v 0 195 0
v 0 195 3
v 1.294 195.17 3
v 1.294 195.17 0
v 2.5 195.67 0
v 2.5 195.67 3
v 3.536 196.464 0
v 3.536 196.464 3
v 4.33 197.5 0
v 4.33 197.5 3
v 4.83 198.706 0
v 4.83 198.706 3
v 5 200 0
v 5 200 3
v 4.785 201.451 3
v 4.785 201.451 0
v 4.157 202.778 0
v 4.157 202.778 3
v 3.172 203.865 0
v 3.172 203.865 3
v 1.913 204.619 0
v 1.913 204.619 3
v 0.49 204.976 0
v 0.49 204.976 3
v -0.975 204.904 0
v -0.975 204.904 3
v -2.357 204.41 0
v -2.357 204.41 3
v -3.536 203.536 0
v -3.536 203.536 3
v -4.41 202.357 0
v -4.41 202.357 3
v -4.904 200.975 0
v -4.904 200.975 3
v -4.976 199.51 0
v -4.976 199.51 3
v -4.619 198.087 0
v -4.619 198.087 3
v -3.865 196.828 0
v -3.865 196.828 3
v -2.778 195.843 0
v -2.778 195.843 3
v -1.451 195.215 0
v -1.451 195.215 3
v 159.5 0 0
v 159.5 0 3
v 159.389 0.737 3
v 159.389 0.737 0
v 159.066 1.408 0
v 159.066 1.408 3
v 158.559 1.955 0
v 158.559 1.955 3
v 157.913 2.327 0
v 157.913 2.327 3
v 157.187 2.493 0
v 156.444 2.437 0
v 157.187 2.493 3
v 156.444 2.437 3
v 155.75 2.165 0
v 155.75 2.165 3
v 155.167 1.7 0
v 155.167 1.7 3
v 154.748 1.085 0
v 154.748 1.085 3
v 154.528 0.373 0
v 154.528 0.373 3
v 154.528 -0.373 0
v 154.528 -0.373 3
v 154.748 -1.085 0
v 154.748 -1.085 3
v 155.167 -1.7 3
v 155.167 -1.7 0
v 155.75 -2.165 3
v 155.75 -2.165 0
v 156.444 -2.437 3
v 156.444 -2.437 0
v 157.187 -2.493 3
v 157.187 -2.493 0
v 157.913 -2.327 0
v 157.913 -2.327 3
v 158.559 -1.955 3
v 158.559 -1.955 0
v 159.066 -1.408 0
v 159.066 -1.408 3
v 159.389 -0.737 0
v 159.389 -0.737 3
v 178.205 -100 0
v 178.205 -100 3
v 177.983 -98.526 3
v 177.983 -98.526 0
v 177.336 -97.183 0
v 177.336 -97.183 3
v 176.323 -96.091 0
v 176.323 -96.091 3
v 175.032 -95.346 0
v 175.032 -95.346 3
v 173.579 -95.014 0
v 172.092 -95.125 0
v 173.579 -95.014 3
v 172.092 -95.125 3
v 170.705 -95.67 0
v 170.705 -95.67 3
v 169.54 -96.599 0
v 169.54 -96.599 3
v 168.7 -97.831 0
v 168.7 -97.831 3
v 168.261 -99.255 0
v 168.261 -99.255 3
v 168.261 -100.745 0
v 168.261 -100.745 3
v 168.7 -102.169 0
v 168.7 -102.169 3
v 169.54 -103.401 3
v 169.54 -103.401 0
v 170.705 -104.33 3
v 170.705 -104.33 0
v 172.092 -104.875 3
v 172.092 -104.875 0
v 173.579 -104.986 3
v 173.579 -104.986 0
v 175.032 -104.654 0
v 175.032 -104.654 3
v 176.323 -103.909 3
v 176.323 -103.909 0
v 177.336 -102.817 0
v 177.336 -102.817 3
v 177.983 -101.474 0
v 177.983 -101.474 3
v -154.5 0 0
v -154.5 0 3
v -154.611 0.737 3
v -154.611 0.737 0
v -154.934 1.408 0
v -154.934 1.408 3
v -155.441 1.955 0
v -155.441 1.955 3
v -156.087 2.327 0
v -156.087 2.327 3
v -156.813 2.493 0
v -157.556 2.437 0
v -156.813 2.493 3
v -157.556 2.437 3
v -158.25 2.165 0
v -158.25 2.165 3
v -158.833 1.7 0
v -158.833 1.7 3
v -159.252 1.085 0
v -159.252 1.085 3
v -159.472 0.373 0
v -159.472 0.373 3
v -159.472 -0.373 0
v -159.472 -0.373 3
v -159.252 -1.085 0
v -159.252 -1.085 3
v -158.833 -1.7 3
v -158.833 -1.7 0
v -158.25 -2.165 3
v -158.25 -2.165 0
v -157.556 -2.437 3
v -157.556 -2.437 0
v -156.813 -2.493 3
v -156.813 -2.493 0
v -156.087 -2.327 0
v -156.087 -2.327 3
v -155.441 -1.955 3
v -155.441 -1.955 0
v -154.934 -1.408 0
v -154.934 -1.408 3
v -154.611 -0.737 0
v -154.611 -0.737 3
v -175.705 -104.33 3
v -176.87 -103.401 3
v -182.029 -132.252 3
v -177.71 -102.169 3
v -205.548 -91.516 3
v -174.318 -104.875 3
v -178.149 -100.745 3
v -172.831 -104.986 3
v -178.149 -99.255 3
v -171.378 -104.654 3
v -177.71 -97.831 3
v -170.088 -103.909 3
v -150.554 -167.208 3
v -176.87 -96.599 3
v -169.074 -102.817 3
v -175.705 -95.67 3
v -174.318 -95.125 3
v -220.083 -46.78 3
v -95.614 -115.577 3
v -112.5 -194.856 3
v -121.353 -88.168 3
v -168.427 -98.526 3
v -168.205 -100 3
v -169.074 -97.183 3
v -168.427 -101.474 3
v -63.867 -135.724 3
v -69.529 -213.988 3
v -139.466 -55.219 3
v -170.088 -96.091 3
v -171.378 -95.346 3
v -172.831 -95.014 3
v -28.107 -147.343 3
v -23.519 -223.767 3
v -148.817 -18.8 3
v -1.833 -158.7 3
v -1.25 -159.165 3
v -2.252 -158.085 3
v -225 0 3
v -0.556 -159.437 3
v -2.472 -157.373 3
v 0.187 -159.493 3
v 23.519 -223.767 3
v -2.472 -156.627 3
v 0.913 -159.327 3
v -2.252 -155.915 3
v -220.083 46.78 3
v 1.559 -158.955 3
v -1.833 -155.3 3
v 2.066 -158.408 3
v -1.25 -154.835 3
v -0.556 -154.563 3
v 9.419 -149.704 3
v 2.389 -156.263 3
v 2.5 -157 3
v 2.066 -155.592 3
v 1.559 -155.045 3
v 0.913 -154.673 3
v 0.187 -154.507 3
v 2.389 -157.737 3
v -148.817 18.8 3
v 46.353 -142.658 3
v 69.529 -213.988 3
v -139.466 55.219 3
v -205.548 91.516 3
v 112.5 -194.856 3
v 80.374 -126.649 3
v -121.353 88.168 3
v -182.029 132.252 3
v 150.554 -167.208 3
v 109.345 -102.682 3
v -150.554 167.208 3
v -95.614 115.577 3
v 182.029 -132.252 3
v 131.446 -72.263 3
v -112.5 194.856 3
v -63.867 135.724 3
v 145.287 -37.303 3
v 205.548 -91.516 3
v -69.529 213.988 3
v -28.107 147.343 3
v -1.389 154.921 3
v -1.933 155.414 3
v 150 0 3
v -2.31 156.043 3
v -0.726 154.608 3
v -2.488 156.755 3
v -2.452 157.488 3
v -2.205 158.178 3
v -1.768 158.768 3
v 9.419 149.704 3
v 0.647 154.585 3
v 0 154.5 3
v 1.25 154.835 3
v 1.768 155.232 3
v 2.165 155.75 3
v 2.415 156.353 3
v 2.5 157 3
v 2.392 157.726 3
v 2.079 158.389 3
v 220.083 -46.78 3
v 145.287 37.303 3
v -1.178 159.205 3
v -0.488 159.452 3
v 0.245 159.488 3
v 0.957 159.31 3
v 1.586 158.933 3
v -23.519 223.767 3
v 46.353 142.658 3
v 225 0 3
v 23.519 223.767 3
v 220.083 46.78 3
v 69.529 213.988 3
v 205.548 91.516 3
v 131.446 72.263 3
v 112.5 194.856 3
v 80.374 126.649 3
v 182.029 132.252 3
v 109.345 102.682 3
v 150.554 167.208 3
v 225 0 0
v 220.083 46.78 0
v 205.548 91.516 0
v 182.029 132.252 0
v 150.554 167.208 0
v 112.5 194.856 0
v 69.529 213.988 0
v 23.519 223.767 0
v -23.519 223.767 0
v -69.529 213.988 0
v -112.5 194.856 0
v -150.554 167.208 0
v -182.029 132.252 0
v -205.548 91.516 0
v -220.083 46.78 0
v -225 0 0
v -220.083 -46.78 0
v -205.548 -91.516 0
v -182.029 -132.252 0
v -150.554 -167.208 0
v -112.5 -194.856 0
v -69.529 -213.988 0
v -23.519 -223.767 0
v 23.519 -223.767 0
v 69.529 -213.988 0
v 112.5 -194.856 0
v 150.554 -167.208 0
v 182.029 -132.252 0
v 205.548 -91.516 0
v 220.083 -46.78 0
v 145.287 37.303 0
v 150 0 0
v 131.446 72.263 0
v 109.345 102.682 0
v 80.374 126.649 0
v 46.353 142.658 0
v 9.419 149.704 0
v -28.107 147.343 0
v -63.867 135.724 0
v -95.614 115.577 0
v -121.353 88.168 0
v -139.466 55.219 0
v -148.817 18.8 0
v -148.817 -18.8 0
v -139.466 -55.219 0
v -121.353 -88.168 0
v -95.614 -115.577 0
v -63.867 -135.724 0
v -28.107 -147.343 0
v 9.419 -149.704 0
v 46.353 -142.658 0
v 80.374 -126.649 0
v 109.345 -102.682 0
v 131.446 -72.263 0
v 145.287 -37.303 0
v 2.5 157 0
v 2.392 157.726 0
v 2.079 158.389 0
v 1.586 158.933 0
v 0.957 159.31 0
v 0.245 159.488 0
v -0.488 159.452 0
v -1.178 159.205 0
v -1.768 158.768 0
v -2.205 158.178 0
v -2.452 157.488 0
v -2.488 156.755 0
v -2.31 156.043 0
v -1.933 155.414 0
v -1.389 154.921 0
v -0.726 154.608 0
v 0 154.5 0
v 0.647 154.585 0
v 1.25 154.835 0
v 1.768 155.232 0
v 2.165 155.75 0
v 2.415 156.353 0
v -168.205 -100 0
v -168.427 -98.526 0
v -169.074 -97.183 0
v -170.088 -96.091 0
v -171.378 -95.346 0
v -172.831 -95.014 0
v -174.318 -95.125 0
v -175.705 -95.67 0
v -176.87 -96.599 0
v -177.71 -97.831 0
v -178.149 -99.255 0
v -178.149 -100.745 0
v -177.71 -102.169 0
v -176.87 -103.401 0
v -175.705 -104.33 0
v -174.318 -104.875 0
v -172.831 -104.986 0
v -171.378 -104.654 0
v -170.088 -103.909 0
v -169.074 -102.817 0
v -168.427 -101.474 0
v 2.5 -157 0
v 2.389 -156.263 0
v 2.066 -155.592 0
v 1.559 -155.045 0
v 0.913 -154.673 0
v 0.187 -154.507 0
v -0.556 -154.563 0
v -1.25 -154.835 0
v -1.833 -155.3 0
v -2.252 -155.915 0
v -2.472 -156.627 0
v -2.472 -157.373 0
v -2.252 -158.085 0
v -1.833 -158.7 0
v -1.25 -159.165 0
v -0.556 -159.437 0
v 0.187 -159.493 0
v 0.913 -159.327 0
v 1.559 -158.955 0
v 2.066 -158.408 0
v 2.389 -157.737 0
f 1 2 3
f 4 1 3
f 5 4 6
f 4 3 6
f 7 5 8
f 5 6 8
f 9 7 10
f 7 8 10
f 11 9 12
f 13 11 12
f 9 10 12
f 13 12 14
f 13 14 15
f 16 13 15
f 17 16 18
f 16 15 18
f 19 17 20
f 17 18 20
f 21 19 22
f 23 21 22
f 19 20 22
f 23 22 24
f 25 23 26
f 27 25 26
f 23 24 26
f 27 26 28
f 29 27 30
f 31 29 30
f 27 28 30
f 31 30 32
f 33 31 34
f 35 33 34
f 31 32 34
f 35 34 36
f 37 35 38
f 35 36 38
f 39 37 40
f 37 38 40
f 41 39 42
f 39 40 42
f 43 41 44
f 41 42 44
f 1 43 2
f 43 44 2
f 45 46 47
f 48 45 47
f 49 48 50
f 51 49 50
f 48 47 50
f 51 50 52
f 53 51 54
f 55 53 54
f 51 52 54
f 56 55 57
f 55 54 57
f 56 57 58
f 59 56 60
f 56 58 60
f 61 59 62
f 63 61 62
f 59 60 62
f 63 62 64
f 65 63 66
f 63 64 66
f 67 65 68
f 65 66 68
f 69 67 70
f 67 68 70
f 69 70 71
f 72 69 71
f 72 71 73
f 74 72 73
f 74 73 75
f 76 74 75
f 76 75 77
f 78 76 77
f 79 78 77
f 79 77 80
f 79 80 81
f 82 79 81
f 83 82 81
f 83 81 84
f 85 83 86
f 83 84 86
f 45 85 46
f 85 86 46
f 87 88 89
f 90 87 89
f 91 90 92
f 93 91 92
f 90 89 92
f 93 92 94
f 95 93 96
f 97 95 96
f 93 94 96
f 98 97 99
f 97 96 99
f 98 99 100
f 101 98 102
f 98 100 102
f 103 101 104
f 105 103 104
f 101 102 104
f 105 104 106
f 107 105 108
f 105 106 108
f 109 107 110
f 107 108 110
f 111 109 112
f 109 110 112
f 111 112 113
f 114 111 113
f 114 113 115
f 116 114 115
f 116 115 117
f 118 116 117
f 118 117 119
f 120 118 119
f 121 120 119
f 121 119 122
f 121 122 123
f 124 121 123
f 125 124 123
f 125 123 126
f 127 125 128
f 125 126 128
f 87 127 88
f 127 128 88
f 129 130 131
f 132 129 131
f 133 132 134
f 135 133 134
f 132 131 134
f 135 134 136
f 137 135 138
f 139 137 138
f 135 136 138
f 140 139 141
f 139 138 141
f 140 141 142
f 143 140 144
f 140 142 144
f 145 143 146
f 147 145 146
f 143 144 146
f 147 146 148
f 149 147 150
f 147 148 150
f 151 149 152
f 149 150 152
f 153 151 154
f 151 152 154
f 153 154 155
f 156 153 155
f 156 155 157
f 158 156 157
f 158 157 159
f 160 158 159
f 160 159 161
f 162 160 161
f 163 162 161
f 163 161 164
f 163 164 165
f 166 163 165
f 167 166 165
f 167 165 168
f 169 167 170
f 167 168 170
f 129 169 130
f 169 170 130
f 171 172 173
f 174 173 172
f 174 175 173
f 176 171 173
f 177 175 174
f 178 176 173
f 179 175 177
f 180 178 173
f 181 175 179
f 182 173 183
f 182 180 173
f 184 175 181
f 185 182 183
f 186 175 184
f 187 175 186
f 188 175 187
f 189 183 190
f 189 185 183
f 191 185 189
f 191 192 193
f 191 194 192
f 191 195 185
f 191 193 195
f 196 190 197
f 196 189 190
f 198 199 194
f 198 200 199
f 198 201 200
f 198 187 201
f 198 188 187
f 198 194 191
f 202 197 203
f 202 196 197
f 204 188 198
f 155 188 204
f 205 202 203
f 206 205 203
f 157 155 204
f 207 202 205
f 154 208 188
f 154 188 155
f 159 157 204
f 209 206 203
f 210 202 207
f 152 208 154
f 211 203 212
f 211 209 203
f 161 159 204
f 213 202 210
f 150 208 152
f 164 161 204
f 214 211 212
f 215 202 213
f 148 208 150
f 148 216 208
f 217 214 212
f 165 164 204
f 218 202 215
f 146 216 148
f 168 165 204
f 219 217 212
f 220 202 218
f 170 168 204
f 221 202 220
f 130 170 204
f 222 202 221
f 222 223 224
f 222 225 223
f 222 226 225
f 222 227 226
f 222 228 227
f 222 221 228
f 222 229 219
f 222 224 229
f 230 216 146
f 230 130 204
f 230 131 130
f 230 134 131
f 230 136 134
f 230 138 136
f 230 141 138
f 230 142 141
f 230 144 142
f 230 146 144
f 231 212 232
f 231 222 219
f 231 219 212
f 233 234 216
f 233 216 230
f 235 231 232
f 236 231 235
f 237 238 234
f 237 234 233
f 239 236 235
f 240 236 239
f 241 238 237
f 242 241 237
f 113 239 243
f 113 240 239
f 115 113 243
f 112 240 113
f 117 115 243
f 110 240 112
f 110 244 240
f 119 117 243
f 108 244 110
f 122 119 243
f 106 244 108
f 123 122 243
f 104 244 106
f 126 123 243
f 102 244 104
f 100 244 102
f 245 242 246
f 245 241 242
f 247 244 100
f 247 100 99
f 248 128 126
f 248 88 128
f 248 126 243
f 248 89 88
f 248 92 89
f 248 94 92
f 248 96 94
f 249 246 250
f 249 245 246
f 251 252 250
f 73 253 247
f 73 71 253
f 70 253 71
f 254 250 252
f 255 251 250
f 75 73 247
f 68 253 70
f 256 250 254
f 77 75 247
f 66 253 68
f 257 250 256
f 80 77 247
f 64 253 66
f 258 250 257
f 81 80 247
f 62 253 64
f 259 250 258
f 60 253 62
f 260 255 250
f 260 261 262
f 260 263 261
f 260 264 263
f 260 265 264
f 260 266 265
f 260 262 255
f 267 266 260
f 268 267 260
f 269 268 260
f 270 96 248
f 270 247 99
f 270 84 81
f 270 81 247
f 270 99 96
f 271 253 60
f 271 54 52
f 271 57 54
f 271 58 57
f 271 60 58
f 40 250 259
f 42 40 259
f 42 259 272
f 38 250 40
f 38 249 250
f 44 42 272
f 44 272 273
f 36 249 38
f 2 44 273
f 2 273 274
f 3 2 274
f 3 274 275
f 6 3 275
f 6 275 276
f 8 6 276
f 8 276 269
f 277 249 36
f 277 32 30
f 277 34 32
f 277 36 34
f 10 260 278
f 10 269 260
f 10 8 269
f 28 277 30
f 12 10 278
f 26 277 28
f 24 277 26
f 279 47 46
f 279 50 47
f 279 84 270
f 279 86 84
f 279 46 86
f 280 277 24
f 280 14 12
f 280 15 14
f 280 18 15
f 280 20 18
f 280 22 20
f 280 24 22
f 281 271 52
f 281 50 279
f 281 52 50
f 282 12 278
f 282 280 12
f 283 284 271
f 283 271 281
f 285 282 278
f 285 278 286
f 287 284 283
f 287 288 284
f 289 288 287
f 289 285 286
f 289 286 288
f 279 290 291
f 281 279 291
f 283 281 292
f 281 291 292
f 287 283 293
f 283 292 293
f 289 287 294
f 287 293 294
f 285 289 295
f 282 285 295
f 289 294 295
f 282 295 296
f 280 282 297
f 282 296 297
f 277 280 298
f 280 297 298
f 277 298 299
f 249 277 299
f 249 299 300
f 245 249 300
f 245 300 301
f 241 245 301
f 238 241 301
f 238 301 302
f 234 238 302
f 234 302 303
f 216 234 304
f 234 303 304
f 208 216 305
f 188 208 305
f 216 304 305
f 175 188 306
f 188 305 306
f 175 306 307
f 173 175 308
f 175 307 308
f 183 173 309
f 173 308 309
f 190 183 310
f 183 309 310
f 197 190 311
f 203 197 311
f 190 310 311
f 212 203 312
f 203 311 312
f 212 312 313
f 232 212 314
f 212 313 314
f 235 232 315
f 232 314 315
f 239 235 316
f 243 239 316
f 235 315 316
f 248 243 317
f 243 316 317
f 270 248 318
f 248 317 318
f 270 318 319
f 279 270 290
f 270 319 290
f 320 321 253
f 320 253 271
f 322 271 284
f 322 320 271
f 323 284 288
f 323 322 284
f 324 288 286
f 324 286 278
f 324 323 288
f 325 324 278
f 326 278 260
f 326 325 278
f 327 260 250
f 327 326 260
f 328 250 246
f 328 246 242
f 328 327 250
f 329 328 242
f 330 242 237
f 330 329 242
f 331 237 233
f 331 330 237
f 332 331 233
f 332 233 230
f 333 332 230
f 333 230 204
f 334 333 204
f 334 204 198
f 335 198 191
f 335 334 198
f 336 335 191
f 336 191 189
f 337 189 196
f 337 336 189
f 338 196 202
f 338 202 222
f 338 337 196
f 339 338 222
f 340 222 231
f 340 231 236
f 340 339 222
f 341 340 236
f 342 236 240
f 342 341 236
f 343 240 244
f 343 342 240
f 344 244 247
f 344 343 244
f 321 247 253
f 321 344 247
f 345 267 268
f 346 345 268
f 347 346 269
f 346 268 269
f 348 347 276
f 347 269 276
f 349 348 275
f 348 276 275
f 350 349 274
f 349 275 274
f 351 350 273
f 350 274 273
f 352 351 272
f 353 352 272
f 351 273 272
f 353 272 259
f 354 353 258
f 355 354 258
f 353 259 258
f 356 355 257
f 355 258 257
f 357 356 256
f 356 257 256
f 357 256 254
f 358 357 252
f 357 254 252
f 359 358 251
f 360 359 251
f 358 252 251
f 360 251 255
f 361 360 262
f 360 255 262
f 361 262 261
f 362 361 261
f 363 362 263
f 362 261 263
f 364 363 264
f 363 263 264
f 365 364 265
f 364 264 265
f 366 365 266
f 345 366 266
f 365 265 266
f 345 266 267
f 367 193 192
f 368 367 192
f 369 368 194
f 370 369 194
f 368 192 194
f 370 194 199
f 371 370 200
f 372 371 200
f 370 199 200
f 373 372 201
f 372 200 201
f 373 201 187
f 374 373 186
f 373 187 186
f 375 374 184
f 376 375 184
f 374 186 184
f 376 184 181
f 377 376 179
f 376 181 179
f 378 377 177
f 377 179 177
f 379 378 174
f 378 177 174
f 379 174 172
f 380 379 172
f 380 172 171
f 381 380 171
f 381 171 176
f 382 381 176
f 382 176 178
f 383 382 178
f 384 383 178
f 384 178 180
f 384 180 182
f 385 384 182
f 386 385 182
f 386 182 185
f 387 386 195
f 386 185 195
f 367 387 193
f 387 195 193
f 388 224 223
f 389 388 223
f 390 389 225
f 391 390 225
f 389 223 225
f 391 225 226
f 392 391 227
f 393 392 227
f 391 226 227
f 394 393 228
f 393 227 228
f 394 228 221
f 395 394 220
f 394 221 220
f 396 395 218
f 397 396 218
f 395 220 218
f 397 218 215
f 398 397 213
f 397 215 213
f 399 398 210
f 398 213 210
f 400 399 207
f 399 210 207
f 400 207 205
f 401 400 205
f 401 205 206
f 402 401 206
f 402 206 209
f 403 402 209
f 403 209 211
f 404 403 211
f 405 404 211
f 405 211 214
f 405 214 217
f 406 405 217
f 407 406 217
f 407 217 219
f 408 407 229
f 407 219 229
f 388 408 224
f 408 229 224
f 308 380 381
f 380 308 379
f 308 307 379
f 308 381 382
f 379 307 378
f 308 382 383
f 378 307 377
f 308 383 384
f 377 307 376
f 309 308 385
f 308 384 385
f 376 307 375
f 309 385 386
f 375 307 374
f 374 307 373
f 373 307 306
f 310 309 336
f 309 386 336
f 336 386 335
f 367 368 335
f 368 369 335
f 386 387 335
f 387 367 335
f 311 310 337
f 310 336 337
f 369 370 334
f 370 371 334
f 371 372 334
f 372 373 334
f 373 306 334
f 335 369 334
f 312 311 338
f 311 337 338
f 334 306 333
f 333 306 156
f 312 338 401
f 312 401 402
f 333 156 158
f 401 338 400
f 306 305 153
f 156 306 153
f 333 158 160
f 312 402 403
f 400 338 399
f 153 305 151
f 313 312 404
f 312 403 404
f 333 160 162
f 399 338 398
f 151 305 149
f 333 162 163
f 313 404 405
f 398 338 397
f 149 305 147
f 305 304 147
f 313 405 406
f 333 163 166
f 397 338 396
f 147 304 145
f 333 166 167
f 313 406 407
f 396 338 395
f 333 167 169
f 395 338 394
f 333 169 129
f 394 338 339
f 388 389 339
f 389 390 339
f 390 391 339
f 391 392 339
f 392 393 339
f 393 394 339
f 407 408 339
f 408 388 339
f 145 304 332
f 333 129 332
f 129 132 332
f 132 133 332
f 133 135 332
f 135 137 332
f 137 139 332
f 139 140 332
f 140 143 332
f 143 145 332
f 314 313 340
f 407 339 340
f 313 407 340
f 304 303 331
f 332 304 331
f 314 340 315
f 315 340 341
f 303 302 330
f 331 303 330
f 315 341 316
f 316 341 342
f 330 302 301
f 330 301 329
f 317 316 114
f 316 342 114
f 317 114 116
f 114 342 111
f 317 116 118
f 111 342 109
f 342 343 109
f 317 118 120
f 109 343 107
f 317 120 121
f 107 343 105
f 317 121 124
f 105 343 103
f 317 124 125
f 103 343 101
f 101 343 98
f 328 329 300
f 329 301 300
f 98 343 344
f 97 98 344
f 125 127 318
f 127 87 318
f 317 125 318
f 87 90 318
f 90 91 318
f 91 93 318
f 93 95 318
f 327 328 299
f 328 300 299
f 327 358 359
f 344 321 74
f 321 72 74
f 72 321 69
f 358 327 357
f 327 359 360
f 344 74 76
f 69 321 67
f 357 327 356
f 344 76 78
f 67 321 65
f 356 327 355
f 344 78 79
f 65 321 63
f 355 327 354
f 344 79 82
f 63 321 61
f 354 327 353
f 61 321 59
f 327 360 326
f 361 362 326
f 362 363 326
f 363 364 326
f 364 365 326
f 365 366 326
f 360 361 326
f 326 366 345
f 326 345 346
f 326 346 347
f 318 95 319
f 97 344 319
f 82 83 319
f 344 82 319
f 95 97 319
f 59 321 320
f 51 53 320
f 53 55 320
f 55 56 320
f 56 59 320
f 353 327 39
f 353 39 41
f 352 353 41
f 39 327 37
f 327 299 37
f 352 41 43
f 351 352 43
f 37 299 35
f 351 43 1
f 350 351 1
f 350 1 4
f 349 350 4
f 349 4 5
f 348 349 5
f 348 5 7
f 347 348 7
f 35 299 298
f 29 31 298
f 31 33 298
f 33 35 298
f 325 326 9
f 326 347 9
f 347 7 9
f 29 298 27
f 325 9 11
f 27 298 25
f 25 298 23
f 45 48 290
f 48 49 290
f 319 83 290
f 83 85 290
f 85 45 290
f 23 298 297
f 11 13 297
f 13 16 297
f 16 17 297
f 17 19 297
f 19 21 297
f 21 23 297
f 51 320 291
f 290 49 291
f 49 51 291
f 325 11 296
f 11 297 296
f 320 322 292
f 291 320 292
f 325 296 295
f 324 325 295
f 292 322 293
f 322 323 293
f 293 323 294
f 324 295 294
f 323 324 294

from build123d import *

# Parameters (mm, degrees)
F0_R     = 225
F0_R_2   = 150
F1_DEPTH = 3
F2_R     = 5
F3_DEPTH = 3
F4_R     = 2.5
F5_DEPTH = 3


with BuildPart() as f1:
    # F0 (on Top) → F1 (new body)
    with BuildSketch(Plane.XY):
        Circle(F0_R)
        Circle(F0_R_2, mode=Mode.SUBTRACT)
    extrude(amount=F1_DEPTH)

    # F2 (on face) → F3 (cut)
    with BuildSketch(Plane.XY.offset(3)):
        with BuildLine():
            ThreePointArc((0, 195), (3.535534, 196.464466), (5, 200))
            ThreePointArc((5, 200), (-3.535534, 203.535534), (0, 195))
        make_face()
        with Locations((-173.205081, -100)):
            Circle(F2_R)
        with Locations((173.205081, -100)):
            Circle(F2_R)
    extrude(amount=-F3_DEPTH, mode=Mode.SUBTRACT)

    # F4 (on face) → F5 (cut)
    with BuildSketch(Plane.XY.offset(3)):
        with BuildLine():
            ThreePointArc((0, 154.5), (1.767767, 155.232233), (2.5, 157))
            ThreePointArc((2.5, 157), (-1.767767, 158.767767), (0, 154.5))
        make_face()
        with Locations((-157, 0)):
            Circle(F4_R)
        with Locations((0, -157)):
            Circle(F4_R)
        with Locations((157, 0)):
            Circle(F4_R)
    extrude(amount=-F5_DEPTH, mode=Mode.SUBTRACT)


solid = f1.part
